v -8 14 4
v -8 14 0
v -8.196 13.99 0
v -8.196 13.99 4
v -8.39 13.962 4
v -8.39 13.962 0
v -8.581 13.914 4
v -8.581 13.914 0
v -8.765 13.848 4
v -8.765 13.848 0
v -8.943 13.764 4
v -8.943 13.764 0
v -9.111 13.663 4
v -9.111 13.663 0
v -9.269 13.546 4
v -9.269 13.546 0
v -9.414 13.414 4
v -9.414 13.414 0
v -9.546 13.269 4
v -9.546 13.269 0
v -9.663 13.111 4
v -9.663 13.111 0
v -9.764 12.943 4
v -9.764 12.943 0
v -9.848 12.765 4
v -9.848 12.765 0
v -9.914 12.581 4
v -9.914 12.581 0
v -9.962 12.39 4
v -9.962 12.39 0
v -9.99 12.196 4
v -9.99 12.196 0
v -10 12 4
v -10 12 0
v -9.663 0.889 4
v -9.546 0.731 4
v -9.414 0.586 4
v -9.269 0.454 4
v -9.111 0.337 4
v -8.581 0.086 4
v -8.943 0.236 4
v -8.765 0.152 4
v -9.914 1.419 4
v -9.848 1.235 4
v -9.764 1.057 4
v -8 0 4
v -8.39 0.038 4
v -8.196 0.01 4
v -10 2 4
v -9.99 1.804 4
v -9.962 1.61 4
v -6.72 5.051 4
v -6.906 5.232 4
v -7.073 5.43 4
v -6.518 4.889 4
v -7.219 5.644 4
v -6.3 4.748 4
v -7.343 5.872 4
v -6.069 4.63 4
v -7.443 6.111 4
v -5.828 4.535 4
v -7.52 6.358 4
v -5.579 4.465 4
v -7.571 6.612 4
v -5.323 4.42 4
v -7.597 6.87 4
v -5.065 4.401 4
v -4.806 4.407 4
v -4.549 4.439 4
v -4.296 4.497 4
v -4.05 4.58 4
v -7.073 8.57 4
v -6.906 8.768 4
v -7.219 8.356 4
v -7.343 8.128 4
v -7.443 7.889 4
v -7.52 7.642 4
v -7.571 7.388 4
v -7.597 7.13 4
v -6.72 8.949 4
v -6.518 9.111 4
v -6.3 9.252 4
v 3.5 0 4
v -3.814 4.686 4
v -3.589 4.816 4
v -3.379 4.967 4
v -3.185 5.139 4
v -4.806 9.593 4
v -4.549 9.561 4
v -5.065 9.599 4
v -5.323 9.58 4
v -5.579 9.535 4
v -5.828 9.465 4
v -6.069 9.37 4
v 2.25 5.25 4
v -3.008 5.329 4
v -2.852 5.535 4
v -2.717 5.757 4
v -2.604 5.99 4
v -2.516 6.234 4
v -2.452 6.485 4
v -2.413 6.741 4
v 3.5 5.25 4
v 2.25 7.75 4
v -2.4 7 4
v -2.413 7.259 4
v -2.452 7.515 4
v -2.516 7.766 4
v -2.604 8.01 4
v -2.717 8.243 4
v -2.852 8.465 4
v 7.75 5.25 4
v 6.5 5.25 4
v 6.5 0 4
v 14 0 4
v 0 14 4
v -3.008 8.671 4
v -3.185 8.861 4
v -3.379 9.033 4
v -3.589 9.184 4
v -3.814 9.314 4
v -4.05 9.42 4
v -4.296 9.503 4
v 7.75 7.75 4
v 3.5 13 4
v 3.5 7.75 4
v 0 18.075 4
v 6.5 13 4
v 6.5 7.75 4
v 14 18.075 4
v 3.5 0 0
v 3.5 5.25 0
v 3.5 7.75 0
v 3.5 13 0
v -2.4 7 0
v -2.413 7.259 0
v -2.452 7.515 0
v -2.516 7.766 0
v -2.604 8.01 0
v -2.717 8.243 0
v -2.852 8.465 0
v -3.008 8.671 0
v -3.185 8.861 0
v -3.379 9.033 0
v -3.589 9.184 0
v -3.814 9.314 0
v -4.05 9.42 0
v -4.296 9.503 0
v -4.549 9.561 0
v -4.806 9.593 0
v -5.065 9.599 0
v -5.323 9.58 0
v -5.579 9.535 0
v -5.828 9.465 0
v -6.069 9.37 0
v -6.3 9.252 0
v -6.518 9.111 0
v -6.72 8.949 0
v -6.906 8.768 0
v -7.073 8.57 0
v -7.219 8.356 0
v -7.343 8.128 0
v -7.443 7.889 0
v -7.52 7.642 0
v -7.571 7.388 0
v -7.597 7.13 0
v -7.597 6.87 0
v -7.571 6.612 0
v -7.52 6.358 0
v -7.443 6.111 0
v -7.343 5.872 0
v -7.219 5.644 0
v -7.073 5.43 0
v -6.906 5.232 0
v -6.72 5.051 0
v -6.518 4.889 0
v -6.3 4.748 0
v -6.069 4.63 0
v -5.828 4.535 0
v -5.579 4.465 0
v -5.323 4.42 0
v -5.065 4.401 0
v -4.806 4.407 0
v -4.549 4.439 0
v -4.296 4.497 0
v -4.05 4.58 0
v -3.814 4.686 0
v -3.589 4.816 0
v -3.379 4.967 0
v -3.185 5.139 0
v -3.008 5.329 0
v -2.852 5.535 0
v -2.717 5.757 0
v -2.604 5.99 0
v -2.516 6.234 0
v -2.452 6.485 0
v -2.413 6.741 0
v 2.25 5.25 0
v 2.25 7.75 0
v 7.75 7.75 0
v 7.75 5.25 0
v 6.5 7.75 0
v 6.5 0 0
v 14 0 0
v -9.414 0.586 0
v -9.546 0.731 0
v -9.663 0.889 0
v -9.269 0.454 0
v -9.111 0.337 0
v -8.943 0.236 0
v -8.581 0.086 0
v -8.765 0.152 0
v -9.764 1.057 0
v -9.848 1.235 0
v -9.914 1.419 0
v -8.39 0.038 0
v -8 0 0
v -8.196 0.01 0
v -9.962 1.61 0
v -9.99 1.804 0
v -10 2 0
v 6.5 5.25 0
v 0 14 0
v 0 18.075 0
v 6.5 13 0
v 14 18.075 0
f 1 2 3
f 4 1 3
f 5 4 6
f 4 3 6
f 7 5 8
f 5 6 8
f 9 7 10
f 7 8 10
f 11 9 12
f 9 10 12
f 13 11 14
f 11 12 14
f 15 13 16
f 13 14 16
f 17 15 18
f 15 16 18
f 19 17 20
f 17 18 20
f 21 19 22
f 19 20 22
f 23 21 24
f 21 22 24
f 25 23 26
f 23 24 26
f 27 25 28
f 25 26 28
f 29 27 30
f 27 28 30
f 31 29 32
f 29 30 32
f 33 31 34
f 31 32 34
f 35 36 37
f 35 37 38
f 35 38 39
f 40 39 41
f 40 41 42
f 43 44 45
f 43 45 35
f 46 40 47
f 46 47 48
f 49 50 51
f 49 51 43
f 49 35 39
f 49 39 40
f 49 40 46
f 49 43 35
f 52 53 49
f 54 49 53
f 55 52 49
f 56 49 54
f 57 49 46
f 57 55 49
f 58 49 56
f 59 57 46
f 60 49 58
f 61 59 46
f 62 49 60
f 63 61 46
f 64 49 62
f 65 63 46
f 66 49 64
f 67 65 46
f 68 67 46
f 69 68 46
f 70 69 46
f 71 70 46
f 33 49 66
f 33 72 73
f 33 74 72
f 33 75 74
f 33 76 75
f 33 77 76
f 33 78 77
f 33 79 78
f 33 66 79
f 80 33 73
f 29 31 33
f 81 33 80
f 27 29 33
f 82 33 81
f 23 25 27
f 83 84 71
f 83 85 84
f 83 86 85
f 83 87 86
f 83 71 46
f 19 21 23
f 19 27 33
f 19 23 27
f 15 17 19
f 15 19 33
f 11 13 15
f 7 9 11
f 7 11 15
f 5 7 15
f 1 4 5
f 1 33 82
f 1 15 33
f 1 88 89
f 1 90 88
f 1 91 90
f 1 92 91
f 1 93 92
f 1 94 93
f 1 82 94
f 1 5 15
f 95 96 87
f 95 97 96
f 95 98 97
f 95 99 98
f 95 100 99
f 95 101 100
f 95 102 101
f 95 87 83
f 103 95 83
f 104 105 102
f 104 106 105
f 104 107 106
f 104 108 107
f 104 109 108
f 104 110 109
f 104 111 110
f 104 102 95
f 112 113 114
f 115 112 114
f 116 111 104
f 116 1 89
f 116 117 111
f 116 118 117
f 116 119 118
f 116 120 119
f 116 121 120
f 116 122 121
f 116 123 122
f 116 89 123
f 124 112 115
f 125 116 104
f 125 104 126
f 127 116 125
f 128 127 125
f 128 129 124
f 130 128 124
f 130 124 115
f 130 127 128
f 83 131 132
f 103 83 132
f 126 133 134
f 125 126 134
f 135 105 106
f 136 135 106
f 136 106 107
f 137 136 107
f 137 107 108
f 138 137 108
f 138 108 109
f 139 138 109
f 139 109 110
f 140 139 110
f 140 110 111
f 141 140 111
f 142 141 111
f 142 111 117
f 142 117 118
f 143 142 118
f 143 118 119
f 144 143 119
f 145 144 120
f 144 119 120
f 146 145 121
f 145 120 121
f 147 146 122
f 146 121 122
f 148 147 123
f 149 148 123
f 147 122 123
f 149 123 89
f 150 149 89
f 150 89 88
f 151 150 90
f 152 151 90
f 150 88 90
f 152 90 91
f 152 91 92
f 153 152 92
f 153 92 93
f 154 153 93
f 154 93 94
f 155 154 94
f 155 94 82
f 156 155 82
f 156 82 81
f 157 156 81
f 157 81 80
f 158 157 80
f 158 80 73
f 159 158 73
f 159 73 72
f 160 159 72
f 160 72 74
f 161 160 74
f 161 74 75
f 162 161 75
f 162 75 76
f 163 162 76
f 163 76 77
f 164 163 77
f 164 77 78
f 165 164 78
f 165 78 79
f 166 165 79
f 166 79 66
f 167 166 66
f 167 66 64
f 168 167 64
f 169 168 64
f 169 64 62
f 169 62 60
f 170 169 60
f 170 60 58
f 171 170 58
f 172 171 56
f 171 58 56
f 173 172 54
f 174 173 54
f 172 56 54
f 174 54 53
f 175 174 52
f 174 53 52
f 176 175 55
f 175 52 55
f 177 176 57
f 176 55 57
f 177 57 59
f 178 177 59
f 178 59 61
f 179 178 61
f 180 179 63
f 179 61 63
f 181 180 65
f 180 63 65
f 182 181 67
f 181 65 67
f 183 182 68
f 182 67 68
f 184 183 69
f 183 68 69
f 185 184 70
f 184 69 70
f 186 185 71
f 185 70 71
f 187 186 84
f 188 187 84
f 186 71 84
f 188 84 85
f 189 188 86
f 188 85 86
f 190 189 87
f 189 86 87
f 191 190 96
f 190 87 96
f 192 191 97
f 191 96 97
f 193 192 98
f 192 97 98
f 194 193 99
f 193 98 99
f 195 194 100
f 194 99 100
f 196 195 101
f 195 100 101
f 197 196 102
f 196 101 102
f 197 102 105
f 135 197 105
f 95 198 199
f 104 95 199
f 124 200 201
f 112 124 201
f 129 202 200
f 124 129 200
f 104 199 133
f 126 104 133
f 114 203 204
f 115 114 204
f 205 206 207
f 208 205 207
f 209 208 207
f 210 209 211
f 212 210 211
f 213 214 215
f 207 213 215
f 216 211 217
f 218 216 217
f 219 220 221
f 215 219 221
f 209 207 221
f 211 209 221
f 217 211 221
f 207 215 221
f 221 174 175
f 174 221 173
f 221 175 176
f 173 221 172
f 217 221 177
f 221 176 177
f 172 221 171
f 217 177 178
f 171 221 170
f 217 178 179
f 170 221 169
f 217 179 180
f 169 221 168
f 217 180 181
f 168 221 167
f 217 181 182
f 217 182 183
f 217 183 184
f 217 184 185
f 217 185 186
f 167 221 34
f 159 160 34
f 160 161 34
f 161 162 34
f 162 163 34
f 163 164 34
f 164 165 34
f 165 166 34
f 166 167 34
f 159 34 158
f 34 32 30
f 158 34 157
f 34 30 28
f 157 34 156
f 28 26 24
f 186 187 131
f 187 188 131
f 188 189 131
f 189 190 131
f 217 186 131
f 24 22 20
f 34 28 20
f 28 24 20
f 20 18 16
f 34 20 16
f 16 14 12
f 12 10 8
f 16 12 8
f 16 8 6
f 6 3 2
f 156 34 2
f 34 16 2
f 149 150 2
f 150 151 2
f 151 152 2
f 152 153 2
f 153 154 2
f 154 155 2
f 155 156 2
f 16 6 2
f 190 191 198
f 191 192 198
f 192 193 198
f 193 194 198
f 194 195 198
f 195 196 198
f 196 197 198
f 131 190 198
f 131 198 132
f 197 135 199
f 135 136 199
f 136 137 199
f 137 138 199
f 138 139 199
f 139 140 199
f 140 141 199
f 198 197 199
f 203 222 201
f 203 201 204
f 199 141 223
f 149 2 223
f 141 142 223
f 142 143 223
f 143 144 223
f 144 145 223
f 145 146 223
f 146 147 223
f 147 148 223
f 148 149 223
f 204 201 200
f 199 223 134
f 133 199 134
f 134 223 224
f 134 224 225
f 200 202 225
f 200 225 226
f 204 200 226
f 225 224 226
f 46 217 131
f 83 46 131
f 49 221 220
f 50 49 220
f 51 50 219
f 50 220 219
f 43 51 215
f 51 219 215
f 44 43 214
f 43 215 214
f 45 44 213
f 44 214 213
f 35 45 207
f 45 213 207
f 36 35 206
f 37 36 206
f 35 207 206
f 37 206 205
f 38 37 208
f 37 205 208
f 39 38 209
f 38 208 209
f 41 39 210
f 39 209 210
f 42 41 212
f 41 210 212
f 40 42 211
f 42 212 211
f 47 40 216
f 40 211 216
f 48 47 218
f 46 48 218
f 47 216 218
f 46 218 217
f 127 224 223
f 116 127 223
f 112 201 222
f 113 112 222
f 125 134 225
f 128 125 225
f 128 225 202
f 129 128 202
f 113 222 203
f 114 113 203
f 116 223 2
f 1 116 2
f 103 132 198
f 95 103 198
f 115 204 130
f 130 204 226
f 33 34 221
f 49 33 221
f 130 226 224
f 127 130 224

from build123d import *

# Parameters (mm, degrees)
EXTRUDE_1_DEPTH     = 4
SKETCH_2_R          = 2.6
CUT_EXTRUDE_1_DEPTH = 10


with BuildPart() as part:
    # Эскиз1 → Бобышка-Вытянуть1 (new body)
    with BuildSketch(Plane.XY):
        with BuildLine():
            Line((14, 0), (14, 18.074674191))
            Line((14, 18.074674191), (5, 18.074674191))
            Line((5, 18.074674191), (0, 18.074674191))
            Line((0, 18.074674191), (0, 14))
            Line((0, 14), (-8, 14))
            ThreePointArc((-8, 14), (-9.414213562, 13.414213562), (-10, 12))
            Line((-10, 12), (-10, 2))
            ThreePointArc((-10, 2), (-9.414213562, 0.585786438), (-8, 0))
            Line((-8, 0), (0, 0))
            Line((0, 0), (3.5, 0))
            Line((3.5, 0), (3.5, 5.25))
            Line((3.5, 5.25), (2.25, 5.25))
            Line((2.25, 5.25), (2.25, 7.75))
            Line((2.25, 7.75), (3.5, 7.75))
            Line((3.5, 7.75), (3.5, 13))
            Line((3.5, 13), (6.5, 13))
            Line((6.5, 13), (6.5, 7.75))
            Line((6.5, 7.75), (7.75, 7.75))
            Line((7.75, 7.75), (7.75, 5.25))
            Line((7.75, 5.25), (6.5, 5.25))
            Line((6.5, 5.25), (6.5, 0))
            Line((6.5, 0), (14, 0))
        make_face()
    extrude(amount=EXTRUDE_1_DEPTH)

    # Эскиз2 → Вырез-Вытянуть1 (cut)
    with BuildSketch(Plane.XY.offset(4)):
        with Locations((-5, 7)):
            Circle(SKETCH_2_R)
    extrude(amount=-CUT_EXTRUDE_1_DEPTH, mode=Mode.SUBTRACT)


solid = part.part
